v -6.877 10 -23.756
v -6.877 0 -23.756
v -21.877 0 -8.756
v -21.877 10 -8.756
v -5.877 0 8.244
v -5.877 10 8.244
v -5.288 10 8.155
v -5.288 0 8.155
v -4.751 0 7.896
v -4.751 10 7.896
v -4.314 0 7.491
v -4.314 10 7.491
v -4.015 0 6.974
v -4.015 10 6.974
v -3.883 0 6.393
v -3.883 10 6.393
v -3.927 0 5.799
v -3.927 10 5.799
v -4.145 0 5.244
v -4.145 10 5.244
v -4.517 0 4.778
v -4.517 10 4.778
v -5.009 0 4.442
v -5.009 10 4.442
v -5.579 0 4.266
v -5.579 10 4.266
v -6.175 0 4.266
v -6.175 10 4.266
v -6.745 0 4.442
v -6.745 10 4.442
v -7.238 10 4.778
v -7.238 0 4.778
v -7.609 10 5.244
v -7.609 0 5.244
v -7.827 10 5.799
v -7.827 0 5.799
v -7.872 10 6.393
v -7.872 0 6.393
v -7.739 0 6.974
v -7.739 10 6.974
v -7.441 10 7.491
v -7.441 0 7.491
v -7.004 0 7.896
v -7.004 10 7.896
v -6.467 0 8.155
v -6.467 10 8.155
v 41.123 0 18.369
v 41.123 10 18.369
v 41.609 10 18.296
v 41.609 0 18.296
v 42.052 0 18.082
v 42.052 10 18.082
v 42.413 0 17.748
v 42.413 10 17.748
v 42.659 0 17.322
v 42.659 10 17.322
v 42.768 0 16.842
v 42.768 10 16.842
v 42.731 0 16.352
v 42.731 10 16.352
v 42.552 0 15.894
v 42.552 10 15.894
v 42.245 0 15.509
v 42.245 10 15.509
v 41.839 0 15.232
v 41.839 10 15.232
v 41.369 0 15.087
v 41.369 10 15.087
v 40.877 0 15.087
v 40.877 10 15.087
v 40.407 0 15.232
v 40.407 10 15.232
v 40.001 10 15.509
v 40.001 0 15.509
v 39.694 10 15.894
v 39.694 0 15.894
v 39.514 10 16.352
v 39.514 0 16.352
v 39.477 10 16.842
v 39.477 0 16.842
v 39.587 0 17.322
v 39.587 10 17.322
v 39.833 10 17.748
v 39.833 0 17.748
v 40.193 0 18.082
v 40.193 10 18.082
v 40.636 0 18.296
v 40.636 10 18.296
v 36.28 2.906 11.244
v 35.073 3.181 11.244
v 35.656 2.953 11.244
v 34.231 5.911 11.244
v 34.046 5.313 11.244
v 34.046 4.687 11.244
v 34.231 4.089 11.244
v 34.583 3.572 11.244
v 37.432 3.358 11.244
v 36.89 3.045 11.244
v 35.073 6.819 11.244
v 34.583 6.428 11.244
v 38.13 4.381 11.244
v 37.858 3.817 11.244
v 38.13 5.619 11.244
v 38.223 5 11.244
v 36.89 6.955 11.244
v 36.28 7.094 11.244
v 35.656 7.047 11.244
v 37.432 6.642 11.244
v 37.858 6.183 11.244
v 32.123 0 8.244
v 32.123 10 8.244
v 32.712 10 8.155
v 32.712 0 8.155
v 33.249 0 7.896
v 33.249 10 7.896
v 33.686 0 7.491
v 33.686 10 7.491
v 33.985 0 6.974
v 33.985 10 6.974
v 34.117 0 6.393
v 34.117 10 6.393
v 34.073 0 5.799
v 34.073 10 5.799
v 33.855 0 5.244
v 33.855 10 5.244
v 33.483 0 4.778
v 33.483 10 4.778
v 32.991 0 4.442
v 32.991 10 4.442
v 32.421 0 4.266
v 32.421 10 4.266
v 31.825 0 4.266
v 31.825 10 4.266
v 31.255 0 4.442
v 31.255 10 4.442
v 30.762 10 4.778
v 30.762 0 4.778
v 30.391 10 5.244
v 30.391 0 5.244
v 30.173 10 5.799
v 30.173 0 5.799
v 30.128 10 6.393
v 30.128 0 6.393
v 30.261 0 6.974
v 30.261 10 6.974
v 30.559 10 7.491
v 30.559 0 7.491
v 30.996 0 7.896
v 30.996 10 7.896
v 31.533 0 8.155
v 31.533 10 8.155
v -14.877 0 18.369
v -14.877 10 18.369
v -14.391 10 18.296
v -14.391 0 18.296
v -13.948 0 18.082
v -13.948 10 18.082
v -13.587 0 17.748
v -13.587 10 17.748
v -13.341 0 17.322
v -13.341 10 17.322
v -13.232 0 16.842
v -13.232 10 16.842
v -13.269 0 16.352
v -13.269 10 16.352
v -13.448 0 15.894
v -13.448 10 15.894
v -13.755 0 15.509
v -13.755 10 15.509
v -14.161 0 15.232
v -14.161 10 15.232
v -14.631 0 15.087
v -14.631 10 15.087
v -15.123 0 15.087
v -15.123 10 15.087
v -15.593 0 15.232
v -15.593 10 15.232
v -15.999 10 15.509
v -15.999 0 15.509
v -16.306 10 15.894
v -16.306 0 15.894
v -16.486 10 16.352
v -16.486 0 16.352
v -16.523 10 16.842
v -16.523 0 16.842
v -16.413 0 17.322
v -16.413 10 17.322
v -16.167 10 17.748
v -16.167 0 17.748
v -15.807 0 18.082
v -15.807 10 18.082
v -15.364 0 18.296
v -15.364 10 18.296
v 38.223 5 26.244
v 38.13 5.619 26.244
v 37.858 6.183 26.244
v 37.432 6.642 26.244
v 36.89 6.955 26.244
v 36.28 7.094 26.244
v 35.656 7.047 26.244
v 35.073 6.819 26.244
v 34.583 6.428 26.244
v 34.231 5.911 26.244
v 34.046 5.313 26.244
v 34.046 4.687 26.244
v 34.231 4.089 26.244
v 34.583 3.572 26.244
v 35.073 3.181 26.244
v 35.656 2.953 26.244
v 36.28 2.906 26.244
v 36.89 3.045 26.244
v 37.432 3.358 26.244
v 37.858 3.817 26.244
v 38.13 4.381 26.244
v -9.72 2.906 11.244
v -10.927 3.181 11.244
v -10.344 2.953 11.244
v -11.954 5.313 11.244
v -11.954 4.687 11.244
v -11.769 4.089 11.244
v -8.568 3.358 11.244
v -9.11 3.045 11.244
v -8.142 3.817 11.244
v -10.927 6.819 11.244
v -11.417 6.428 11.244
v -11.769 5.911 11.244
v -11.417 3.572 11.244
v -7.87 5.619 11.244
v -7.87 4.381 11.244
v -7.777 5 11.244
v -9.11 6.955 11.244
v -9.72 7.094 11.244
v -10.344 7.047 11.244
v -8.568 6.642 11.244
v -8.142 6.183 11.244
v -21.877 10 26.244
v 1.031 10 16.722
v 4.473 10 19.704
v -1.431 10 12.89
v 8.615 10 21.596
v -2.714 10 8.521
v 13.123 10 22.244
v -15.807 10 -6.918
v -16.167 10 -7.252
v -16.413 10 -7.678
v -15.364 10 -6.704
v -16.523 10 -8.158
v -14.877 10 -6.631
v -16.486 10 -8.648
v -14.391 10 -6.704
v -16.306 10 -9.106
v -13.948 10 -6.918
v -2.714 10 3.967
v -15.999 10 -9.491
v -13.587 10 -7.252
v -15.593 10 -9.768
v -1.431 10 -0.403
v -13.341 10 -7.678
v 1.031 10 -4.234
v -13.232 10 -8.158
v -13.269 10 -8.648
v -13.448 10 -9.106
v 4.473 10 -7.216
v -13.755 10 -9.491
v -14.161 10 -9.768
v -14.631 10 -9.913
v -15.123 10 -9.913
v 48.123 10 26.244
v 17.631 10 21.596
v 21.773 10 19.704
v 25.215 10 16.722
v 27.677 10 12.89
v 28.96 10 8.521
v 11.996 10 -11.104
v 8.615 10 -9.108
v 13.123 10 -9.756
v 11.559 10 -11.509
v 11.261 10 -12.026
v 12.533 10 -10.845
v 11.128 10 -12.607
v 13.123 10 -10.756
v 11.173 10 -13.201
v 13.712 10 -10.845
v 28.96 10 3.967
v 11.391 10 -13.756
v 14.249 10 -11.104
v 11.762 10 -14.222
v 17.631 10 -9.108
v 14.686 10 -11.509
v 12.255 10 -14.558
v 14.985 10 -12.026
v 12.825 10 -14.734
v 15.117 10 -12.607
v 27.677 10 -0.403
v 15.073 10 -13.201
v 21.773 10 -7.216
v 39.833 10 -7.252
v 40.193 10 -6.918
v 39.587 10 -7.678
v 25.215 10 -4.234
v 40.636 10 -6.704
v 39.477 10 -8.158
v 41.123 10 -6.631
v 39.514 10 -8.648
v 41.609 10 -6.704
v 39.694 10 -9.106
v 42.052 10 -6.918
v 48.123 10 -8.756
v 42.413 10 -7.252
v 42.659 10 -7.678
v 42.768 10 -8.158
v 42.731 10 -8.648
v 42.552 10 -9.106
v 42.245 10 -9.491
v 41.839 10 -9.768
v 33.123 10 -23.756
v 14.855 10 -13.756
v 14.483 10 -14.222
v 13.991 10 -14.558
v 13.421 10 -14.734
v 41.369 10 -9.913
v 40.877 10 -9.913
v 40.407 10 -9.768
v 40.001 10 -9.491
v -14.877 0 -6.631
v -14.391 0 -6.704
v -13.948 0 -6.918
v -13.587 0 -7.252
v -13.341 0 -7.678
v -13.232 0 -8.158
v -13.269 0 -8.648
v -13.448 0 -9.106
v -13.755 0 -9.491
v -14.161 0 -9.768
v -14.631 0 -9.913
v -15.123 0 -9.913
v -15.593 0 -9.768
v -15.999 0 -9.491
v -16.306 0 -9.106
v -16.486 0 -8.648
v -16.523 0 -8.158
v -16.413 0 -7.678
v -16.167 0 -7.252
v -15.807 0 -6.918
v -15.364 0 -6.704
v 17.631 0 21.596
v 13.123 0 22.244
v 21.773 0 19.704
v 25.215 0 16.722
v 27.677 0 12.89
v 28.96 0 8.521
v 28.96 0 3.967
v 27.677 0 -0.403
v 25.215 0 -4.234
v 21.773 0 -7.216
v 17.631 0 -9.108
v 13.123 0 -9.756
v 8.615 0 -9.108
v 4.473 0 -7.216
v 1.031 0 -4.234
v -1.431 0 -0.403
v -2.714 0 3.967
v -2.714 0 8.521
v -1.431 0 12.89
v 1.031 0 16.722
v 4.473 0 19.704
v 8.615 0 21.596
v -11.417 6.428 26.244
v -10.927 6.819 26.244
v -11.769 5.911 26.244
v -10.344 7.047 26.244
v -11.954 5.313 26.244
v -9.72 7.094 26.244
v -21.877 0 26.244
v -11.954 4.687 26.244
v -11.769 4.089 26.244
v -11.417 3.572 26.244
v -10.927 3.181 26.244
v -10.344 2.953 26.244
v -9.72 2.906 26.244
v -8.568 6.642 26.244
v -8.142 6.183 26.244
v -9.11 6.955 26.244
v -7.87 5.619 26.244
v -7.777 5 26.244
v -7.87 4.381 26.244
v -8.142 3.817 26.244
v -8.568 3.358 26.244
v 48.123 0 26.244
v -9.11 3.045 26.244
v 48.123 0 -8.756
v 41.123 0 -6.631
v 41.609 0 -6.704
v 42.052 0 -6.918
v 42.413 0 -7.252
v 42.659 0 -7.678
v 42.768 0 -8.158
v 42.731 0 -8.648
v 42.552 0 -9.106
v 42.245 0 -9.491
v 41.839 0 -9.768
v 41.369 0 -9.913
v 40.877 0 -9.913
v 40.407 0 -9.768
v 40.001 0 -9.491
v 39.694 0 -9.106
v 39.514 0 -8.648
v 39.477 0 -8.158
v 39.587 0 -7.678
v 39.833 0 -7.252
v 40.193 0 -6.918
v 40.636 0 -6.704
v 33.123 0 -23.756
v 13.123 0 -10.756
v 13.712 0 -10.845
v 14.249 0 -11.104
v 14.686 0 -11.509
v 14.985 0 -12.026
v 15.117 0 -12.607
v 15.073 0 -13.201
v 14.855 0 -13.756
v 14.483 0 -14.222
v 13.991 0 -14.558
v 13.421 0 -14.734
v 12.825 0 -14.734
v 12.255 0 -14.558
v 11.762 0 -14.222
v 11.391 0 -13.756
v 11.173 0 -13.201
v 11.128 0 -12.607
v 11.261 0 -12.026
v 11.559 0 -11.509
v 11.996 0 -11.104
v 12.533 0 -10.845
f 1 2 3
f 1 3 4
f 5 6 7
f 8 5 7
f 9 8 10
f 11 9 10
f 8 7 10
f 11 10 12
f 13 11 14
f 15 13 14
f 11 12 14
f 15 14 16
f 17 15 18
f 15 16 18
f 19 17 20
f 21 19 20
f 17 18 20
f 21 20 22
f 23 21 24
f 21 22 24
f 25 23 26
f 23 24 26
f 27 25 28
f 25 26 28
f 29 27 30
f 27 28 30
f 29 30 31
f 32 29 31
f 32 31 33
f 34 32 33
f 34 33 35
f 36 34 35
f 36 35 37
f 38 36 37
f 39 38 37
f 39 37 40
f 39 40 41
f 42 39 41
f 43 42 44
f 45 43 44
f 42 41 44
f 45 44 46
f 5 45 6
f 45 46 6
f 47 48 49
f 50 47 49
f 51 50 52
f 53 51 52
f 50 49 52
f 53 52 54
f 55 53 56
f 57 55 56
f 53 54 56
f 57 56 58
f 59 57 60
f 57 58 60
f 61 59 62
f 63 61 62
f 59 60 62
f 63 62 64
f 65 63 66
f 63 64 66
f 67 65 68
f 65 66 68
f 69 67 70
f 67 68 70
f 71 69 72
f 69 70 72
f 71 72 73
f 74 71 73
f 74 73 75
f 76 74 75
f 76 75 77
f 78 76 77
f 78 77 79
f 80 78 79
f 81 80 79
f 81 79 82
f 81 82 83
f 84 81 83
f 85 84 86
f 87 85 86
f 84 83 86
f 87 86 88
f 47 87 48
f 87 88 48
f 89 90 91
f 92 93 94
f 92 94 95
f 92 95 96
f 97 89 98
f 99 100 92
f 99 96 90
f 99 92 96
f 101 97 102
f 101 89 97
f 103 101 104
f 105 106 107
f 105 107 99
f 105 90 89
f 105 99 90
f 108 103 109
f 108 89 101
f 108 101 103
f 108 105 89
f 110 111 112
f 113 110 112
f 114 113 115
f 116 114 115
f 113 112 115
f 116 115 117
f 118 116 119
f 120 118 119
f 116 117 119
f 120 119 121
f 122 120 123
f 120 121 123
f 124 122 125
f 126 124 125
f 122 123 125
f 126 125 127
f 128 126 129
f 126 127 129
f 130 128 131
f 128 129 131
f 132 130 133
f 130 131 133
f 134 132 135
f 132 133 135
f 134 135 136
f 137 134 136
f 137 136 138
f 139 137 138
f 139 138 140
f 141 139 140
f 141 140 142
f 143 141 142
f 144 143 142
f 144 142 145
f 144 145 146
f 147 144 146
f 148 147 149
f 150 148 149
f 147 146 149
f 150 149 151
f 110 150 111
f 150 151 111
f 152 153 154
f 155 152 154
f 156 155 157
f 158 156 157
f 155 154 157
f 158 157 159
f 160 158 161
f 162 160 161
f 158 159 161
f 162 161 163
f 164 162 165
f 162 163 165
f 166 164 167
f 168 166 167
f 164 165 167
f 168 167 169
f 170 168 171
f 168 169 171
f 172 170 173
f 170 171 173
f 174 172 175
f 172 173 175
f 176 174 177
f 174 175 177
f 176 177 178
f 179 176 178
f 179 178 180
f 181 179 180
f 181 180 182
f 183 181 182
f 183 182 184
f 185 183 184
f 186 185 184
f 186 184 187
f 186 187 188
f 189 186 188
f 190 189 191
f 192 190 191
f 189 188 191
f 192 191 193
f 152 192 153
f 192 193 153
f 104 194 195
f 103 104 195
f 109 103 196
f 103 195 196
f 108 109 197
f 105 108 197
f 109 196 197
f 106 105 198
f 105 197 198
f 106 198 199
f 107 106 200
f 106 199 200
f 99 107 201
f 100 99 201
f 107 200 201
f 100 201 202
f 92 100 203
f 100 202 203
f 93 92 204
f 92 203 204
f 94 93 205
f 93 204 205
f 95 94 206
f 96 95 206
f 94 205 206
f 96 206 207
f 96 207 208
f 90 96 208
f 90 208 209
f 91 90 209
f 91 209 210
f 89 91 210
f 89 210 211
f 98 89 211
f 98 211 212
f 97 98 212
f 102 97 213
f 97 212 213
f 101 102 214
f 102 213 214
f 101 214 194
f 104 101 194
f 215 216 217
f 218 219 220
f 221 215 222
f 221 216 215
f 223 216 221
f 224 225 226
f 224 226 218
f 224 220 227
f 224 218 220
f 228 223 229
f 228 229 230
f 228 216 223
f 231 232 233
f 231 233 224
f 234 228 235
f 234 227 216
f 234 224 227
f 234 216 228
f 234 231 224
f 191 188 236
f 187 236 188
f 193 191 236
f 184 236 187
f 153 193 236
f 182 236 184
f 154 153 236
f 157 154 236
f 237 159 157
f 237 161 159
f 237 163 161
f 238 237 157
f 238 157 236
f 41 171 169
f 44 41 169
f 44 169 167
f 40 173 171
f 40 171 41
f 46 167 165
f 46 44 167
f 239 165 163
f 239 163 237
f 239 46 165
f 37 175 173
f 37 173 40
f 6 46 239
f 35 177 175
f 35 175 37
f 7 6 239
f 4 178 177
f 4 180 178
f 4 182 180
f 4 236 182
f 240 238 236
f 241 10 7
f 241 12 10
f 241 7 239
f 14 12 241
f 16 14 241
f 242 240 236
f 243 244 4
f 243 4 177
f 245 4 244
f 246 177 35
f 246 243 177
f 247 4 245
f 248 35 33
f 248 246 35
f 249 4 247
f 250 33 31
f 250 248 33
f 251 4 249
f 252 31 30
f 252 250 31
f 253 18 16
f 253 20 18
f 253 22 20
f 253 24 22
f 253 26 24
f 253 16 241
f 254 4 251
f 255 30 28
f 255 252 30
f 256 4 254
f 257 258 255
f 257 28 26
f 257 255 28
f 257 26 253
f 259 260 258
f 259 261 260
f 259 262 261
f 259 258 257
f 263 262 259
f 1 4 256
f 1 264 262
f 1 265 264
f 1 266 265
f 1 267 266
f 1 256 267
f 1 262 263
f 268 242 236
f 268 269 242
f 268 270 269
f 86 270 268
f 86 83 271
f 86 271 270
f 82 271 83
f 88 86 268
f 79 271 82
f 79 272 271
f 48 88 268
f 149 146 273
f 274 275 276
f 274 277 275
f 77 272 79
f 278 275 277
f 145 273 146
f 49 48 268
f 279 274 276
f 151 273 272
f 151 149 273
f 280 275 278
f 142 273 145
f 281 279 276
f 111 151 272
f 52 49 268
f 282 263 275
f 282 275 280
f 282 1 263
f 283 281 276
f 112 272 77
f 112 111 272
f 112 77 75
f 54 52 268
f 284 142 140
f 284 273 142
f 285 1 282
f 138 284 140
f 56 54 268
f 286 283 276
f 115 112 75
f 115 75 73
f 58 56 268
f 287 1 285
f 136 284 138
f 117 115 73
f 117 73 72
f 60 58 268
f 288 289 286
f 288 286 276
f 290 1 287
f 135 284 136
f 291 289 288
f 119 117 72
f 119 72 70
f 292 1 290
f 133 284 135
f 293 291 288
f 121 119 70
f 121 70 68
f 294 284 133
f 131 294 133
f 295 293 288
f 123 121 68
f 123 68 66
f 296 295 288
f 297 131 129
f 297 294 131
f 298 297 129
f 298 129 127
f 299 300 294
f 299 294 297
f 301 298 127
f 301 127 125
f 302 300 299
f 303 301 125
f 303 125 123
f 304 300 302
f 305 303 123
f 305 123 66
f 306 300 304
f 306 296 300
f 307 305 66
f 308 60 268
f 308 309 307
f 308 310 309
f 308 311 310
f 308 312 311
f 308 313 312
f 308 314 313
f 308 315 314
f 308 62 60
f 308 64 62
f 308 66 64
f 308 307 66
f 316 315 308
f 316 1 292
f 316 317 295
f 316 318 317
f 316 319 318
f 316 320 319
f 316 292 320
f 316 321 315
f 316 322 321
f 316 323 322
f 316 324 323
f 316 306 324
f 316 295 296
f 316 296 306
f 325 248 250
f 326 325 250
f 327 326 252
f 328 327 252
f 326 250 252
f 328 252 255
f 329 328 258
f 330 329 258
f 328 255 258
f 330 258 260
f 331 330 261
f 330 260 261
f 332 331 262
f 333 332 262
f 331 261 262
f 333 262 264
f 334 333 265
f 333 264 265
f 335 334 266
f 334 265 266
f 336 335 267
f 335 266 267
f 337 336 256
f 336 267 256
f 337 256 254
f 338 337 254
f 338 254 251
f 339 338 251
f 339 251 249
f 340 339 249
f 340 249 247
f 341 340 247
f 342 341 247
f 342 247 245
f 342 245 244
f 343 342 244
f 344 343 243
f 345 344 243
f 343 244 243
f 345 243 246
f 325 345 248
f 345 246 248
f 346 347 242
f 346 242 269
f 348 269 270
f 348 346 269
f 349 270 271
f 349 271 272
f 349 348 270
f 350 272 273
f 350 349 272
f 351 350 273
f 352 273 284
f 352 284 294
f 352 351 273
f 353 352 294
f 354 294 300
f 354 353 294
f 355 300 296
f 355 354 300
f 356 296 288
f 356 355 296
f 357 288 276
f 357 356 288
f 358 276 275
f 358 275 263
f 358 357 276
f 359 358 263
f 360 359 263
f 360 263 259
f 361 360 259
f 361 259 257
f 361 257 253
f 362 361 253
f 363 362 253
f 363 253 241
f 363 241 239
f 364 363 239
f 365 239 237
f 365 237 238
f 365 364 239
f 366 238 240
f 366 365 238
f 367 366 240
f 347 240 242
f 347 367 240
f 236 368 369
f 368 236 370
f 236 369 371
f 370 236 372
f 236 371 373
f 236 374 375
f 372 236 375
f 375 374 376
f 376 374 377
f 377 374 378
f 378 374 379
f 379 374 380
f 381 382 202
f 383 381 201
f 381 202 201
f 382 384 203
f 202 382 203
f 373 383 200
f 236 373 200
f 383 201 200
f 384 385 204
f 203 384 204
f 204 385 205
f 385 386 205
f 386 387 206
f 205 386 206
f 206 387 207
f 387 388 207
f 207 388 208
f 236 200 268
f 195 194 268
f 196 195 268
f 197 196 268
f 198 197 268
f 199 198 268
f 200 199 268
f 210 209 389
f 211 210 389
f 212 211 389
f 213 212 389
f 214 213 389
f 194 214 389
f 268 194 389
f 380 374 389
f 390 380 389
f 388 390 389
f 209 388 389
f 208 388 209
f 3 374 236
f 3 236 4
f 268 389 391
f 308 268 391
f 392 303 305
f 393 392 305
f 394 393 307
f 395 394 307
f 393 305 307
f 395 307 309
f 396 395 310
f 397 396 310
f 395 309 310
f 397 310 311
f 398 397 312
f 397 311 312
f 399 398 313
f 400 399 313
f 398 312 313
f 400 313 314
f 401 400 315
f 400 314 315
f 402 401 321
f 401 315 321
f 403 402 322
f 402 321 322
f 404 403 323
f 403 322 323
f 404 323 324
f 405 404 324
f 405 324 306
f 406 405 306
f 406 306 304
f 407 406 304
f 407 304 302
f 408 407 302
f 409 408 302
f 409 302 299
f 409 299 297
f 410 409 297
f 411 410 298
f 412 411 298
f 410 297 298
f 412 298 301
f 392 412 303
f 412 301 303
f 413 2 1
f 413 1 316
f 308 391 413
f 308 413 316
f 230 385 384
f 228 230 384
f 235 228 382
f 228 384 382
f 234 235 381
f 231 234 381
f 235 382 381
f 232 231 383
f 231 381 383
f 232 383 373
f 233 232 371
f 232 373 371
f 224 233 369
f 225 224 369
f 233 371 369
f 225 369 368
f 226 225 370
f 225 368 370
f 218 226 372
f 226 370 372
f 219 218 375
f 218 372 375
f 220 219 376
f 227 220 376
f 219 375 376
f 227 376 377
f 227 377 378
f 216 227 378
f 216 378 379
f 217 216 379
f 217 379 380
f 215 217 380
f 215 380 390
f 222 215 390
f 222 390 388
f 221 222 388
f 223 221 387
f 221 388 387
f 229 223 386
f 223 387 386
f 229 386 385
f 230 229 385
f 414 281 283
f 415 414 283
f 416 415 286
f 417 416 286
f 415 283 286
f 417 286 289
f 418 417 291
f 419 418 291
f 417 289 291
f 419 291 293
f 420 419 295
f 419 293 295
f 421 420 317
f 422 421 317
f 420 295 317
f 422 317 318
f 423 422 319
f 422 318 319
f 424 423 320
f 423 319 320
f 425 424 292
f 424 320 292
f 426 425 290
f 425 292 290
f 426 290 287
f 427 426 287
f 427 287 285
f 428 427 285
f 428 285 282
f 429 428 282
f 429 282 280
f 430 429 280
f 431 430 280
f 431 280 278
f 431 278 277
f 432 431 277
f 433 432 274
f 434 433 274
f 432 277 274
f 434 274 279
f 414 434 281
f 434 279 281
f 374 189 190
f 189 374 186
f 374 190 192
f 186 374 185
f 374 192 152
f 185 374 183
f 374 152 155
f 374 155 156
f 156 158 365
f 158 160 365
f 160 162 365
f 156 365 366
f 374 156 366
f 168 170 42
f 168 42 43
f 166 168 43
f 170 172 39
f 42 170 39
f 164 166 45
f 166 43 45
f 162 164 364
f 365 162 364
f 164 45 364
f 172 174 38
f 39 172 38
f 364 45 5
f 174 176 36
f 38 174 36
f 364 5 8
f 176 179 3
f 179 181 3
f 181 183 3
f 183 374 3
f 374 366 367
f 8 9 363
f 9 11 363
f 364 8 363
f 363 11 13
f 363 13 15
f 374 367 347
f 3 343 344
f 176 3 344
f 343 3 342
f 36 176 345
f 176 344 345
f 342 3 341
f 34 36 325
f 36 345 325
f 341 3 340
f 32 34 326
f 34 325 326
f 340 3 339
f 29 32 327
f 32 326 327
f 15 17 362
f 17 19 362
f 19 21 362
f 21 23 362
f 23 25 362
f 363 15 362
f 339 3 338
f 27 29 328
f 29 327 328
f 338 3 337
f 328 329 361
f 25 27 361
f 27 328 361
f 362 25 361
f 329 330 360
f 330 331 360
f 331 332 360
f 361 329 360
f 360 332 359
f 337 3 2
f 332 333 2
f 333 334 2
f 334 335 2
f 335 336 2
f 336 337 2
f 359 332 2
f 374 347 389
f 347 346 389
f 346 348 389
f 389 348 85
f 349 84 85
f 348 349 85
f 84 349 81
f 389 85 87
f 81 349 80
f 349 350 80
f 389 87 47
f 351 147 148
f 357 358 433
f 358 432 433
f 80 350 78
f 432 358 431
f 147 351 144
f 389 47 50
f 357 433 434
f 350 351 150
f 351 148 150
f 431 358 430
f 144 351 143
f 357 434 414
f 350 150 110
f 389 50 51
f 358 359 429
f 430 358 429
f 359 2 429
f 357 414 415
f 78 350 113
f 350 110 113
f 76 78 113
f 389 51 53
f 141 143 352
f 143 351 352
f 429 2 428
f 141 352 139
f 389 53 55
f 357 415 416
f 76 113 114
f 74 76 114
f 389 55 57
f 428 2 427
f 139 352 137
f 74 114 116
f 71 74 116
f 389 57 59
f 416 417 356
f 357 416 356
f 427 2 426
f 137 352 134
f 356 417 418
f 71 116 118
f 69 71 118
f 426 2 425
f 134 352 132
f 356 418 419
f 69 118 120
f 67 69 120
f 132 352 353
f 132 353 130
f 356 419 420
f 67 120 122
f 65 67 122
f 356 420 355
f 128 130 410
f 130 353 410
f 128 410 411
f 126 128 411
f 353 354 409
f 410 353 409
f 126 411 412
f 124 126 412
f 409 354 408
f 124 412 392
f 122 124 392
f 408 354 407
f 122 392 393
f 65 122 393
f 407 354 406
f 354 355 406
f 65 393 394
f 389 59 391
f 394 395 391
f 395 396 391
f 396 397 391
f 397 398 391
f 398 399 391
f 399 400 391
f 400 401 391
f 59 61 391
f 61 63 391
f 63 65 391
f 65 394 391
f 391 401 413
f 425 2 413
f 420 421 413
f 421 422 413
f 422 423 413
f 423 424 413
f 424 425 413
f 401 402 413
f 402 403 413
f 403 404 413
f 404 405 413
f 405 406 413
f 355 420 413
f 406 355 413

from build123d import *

# Parameters (mm, degrees)
SKETCH_1_W          = 70
SKETCH_1_H          = 50
SKETCH_1_R          = 16
EXTRUDE_1_DEPTH     = 10
CHAMFER_1_SIZE      = 15
SKETCH_4_R          = 2
CUT_EXTRUDE_3_DEPTH = 10
SKETCH_7_R          = 1.65
CUT_EXTRUDE_5_DEPTH = 10
SKETCH_8_R          = 2.1
CUT_EXTRUDE_6_DEPTH = 15


with BuildPart() as part:
    # Эскиз1 → Бобышка-Вытянуть1 (new body)
    with BuildSketch(Plane(origin=(0, 0, 0), x_dir=(1, 0, 0), z_dir=(0, 1, 0))):
        with Locations((13.122832672, -1.243812166)):
            Rectangle(SKETCH_1_W, SKETCH_1_H)
        with Locations(Location((13.122832672, -6.243812166, 0), (0, 0, 270))):
            Circle(SKETCH_1_R, mode=Mode.SUBTRACT)
    extrude(amount=EXTRUDE_1_DEPTH)

    # Фаска1
    chamfer_1_edges = [part.edges().sort_by_distance(p)[0] for p in [
        (-21.877167328, 5, -23.756187834),
        (48.122832672, 5, -23.756187834),
    ]]
    chamfer(chamfer_1_edges, length=CHAMFER_1_SIZE)

    # Эскиз4 → Вырез-Вытянуть3 (cut)
    with BuildSketch(Plane(origin=(0, 10, 0), x_dir=(1, 0, 0), z_dir=(0, 1, 0))):
        with Locations(Location((32.122832672, -6.243812166, 0), (0, 0, 270))):
            Circle(SKETCH_4_R)
        with Locations(Location((13.122832672, 12.756187834, 0), (0, 0, 270))):
            Circle(SKETCH_4_R)
        with Locations(Location((-5.877167328, -6.243812166, 0), (0, 0, 270))):
            Circle(SKETCH_4_R)
    extrude(amount=-CUT_EXTRUDE_3_DEPTH, mode=Mode.SUBTRACT)

    # Эскиз7 → Вырез-Вытянуть5 (cut)
    with BuildSketch(Plane(origin=(0, 10, 0), x_dir=(1, 0, 0), z_dir=(0, 1, 0))):
        with Locations(Location((41.122832672, 8.281187834, 0), (0, 0, 270))):
            Circle(SKETCH_7_R)
        with Locations(Location((41.122832672, -16.718812166, 0), (0, 0, 270))):
            Circle(SKETCH_7_R)
        with Locations(Location((-14.877167328, 8.281187834, 0), (0, 0, 270))):
            Circle(SKETCH_7_R)
        with Locations(Location((-14.877167328, -16.718812166, 0), (0, 0, 270))):
            Circle(SKETCH_7_R)
    extrude(amount=-CUT_EXTRUDE_5_DEPTH, mode=Mode.SUBTRACT)

    # Эскиз8 → Вырез-Вытянуть6 (cut)
    with BuildSketch(Plane.XY.offset(26.243812166)):
        with Locations((-9.877167328, 5)):
            Circle(SKETCH_8_R)
        with Locations((36.122832672, 5)):
            Circle(SKETCH_8_R)
    extrude(amount=-CUT_EXTRUDE_6_DEPTH, mode=Mode.SUBTRACT)


solid = part.part
